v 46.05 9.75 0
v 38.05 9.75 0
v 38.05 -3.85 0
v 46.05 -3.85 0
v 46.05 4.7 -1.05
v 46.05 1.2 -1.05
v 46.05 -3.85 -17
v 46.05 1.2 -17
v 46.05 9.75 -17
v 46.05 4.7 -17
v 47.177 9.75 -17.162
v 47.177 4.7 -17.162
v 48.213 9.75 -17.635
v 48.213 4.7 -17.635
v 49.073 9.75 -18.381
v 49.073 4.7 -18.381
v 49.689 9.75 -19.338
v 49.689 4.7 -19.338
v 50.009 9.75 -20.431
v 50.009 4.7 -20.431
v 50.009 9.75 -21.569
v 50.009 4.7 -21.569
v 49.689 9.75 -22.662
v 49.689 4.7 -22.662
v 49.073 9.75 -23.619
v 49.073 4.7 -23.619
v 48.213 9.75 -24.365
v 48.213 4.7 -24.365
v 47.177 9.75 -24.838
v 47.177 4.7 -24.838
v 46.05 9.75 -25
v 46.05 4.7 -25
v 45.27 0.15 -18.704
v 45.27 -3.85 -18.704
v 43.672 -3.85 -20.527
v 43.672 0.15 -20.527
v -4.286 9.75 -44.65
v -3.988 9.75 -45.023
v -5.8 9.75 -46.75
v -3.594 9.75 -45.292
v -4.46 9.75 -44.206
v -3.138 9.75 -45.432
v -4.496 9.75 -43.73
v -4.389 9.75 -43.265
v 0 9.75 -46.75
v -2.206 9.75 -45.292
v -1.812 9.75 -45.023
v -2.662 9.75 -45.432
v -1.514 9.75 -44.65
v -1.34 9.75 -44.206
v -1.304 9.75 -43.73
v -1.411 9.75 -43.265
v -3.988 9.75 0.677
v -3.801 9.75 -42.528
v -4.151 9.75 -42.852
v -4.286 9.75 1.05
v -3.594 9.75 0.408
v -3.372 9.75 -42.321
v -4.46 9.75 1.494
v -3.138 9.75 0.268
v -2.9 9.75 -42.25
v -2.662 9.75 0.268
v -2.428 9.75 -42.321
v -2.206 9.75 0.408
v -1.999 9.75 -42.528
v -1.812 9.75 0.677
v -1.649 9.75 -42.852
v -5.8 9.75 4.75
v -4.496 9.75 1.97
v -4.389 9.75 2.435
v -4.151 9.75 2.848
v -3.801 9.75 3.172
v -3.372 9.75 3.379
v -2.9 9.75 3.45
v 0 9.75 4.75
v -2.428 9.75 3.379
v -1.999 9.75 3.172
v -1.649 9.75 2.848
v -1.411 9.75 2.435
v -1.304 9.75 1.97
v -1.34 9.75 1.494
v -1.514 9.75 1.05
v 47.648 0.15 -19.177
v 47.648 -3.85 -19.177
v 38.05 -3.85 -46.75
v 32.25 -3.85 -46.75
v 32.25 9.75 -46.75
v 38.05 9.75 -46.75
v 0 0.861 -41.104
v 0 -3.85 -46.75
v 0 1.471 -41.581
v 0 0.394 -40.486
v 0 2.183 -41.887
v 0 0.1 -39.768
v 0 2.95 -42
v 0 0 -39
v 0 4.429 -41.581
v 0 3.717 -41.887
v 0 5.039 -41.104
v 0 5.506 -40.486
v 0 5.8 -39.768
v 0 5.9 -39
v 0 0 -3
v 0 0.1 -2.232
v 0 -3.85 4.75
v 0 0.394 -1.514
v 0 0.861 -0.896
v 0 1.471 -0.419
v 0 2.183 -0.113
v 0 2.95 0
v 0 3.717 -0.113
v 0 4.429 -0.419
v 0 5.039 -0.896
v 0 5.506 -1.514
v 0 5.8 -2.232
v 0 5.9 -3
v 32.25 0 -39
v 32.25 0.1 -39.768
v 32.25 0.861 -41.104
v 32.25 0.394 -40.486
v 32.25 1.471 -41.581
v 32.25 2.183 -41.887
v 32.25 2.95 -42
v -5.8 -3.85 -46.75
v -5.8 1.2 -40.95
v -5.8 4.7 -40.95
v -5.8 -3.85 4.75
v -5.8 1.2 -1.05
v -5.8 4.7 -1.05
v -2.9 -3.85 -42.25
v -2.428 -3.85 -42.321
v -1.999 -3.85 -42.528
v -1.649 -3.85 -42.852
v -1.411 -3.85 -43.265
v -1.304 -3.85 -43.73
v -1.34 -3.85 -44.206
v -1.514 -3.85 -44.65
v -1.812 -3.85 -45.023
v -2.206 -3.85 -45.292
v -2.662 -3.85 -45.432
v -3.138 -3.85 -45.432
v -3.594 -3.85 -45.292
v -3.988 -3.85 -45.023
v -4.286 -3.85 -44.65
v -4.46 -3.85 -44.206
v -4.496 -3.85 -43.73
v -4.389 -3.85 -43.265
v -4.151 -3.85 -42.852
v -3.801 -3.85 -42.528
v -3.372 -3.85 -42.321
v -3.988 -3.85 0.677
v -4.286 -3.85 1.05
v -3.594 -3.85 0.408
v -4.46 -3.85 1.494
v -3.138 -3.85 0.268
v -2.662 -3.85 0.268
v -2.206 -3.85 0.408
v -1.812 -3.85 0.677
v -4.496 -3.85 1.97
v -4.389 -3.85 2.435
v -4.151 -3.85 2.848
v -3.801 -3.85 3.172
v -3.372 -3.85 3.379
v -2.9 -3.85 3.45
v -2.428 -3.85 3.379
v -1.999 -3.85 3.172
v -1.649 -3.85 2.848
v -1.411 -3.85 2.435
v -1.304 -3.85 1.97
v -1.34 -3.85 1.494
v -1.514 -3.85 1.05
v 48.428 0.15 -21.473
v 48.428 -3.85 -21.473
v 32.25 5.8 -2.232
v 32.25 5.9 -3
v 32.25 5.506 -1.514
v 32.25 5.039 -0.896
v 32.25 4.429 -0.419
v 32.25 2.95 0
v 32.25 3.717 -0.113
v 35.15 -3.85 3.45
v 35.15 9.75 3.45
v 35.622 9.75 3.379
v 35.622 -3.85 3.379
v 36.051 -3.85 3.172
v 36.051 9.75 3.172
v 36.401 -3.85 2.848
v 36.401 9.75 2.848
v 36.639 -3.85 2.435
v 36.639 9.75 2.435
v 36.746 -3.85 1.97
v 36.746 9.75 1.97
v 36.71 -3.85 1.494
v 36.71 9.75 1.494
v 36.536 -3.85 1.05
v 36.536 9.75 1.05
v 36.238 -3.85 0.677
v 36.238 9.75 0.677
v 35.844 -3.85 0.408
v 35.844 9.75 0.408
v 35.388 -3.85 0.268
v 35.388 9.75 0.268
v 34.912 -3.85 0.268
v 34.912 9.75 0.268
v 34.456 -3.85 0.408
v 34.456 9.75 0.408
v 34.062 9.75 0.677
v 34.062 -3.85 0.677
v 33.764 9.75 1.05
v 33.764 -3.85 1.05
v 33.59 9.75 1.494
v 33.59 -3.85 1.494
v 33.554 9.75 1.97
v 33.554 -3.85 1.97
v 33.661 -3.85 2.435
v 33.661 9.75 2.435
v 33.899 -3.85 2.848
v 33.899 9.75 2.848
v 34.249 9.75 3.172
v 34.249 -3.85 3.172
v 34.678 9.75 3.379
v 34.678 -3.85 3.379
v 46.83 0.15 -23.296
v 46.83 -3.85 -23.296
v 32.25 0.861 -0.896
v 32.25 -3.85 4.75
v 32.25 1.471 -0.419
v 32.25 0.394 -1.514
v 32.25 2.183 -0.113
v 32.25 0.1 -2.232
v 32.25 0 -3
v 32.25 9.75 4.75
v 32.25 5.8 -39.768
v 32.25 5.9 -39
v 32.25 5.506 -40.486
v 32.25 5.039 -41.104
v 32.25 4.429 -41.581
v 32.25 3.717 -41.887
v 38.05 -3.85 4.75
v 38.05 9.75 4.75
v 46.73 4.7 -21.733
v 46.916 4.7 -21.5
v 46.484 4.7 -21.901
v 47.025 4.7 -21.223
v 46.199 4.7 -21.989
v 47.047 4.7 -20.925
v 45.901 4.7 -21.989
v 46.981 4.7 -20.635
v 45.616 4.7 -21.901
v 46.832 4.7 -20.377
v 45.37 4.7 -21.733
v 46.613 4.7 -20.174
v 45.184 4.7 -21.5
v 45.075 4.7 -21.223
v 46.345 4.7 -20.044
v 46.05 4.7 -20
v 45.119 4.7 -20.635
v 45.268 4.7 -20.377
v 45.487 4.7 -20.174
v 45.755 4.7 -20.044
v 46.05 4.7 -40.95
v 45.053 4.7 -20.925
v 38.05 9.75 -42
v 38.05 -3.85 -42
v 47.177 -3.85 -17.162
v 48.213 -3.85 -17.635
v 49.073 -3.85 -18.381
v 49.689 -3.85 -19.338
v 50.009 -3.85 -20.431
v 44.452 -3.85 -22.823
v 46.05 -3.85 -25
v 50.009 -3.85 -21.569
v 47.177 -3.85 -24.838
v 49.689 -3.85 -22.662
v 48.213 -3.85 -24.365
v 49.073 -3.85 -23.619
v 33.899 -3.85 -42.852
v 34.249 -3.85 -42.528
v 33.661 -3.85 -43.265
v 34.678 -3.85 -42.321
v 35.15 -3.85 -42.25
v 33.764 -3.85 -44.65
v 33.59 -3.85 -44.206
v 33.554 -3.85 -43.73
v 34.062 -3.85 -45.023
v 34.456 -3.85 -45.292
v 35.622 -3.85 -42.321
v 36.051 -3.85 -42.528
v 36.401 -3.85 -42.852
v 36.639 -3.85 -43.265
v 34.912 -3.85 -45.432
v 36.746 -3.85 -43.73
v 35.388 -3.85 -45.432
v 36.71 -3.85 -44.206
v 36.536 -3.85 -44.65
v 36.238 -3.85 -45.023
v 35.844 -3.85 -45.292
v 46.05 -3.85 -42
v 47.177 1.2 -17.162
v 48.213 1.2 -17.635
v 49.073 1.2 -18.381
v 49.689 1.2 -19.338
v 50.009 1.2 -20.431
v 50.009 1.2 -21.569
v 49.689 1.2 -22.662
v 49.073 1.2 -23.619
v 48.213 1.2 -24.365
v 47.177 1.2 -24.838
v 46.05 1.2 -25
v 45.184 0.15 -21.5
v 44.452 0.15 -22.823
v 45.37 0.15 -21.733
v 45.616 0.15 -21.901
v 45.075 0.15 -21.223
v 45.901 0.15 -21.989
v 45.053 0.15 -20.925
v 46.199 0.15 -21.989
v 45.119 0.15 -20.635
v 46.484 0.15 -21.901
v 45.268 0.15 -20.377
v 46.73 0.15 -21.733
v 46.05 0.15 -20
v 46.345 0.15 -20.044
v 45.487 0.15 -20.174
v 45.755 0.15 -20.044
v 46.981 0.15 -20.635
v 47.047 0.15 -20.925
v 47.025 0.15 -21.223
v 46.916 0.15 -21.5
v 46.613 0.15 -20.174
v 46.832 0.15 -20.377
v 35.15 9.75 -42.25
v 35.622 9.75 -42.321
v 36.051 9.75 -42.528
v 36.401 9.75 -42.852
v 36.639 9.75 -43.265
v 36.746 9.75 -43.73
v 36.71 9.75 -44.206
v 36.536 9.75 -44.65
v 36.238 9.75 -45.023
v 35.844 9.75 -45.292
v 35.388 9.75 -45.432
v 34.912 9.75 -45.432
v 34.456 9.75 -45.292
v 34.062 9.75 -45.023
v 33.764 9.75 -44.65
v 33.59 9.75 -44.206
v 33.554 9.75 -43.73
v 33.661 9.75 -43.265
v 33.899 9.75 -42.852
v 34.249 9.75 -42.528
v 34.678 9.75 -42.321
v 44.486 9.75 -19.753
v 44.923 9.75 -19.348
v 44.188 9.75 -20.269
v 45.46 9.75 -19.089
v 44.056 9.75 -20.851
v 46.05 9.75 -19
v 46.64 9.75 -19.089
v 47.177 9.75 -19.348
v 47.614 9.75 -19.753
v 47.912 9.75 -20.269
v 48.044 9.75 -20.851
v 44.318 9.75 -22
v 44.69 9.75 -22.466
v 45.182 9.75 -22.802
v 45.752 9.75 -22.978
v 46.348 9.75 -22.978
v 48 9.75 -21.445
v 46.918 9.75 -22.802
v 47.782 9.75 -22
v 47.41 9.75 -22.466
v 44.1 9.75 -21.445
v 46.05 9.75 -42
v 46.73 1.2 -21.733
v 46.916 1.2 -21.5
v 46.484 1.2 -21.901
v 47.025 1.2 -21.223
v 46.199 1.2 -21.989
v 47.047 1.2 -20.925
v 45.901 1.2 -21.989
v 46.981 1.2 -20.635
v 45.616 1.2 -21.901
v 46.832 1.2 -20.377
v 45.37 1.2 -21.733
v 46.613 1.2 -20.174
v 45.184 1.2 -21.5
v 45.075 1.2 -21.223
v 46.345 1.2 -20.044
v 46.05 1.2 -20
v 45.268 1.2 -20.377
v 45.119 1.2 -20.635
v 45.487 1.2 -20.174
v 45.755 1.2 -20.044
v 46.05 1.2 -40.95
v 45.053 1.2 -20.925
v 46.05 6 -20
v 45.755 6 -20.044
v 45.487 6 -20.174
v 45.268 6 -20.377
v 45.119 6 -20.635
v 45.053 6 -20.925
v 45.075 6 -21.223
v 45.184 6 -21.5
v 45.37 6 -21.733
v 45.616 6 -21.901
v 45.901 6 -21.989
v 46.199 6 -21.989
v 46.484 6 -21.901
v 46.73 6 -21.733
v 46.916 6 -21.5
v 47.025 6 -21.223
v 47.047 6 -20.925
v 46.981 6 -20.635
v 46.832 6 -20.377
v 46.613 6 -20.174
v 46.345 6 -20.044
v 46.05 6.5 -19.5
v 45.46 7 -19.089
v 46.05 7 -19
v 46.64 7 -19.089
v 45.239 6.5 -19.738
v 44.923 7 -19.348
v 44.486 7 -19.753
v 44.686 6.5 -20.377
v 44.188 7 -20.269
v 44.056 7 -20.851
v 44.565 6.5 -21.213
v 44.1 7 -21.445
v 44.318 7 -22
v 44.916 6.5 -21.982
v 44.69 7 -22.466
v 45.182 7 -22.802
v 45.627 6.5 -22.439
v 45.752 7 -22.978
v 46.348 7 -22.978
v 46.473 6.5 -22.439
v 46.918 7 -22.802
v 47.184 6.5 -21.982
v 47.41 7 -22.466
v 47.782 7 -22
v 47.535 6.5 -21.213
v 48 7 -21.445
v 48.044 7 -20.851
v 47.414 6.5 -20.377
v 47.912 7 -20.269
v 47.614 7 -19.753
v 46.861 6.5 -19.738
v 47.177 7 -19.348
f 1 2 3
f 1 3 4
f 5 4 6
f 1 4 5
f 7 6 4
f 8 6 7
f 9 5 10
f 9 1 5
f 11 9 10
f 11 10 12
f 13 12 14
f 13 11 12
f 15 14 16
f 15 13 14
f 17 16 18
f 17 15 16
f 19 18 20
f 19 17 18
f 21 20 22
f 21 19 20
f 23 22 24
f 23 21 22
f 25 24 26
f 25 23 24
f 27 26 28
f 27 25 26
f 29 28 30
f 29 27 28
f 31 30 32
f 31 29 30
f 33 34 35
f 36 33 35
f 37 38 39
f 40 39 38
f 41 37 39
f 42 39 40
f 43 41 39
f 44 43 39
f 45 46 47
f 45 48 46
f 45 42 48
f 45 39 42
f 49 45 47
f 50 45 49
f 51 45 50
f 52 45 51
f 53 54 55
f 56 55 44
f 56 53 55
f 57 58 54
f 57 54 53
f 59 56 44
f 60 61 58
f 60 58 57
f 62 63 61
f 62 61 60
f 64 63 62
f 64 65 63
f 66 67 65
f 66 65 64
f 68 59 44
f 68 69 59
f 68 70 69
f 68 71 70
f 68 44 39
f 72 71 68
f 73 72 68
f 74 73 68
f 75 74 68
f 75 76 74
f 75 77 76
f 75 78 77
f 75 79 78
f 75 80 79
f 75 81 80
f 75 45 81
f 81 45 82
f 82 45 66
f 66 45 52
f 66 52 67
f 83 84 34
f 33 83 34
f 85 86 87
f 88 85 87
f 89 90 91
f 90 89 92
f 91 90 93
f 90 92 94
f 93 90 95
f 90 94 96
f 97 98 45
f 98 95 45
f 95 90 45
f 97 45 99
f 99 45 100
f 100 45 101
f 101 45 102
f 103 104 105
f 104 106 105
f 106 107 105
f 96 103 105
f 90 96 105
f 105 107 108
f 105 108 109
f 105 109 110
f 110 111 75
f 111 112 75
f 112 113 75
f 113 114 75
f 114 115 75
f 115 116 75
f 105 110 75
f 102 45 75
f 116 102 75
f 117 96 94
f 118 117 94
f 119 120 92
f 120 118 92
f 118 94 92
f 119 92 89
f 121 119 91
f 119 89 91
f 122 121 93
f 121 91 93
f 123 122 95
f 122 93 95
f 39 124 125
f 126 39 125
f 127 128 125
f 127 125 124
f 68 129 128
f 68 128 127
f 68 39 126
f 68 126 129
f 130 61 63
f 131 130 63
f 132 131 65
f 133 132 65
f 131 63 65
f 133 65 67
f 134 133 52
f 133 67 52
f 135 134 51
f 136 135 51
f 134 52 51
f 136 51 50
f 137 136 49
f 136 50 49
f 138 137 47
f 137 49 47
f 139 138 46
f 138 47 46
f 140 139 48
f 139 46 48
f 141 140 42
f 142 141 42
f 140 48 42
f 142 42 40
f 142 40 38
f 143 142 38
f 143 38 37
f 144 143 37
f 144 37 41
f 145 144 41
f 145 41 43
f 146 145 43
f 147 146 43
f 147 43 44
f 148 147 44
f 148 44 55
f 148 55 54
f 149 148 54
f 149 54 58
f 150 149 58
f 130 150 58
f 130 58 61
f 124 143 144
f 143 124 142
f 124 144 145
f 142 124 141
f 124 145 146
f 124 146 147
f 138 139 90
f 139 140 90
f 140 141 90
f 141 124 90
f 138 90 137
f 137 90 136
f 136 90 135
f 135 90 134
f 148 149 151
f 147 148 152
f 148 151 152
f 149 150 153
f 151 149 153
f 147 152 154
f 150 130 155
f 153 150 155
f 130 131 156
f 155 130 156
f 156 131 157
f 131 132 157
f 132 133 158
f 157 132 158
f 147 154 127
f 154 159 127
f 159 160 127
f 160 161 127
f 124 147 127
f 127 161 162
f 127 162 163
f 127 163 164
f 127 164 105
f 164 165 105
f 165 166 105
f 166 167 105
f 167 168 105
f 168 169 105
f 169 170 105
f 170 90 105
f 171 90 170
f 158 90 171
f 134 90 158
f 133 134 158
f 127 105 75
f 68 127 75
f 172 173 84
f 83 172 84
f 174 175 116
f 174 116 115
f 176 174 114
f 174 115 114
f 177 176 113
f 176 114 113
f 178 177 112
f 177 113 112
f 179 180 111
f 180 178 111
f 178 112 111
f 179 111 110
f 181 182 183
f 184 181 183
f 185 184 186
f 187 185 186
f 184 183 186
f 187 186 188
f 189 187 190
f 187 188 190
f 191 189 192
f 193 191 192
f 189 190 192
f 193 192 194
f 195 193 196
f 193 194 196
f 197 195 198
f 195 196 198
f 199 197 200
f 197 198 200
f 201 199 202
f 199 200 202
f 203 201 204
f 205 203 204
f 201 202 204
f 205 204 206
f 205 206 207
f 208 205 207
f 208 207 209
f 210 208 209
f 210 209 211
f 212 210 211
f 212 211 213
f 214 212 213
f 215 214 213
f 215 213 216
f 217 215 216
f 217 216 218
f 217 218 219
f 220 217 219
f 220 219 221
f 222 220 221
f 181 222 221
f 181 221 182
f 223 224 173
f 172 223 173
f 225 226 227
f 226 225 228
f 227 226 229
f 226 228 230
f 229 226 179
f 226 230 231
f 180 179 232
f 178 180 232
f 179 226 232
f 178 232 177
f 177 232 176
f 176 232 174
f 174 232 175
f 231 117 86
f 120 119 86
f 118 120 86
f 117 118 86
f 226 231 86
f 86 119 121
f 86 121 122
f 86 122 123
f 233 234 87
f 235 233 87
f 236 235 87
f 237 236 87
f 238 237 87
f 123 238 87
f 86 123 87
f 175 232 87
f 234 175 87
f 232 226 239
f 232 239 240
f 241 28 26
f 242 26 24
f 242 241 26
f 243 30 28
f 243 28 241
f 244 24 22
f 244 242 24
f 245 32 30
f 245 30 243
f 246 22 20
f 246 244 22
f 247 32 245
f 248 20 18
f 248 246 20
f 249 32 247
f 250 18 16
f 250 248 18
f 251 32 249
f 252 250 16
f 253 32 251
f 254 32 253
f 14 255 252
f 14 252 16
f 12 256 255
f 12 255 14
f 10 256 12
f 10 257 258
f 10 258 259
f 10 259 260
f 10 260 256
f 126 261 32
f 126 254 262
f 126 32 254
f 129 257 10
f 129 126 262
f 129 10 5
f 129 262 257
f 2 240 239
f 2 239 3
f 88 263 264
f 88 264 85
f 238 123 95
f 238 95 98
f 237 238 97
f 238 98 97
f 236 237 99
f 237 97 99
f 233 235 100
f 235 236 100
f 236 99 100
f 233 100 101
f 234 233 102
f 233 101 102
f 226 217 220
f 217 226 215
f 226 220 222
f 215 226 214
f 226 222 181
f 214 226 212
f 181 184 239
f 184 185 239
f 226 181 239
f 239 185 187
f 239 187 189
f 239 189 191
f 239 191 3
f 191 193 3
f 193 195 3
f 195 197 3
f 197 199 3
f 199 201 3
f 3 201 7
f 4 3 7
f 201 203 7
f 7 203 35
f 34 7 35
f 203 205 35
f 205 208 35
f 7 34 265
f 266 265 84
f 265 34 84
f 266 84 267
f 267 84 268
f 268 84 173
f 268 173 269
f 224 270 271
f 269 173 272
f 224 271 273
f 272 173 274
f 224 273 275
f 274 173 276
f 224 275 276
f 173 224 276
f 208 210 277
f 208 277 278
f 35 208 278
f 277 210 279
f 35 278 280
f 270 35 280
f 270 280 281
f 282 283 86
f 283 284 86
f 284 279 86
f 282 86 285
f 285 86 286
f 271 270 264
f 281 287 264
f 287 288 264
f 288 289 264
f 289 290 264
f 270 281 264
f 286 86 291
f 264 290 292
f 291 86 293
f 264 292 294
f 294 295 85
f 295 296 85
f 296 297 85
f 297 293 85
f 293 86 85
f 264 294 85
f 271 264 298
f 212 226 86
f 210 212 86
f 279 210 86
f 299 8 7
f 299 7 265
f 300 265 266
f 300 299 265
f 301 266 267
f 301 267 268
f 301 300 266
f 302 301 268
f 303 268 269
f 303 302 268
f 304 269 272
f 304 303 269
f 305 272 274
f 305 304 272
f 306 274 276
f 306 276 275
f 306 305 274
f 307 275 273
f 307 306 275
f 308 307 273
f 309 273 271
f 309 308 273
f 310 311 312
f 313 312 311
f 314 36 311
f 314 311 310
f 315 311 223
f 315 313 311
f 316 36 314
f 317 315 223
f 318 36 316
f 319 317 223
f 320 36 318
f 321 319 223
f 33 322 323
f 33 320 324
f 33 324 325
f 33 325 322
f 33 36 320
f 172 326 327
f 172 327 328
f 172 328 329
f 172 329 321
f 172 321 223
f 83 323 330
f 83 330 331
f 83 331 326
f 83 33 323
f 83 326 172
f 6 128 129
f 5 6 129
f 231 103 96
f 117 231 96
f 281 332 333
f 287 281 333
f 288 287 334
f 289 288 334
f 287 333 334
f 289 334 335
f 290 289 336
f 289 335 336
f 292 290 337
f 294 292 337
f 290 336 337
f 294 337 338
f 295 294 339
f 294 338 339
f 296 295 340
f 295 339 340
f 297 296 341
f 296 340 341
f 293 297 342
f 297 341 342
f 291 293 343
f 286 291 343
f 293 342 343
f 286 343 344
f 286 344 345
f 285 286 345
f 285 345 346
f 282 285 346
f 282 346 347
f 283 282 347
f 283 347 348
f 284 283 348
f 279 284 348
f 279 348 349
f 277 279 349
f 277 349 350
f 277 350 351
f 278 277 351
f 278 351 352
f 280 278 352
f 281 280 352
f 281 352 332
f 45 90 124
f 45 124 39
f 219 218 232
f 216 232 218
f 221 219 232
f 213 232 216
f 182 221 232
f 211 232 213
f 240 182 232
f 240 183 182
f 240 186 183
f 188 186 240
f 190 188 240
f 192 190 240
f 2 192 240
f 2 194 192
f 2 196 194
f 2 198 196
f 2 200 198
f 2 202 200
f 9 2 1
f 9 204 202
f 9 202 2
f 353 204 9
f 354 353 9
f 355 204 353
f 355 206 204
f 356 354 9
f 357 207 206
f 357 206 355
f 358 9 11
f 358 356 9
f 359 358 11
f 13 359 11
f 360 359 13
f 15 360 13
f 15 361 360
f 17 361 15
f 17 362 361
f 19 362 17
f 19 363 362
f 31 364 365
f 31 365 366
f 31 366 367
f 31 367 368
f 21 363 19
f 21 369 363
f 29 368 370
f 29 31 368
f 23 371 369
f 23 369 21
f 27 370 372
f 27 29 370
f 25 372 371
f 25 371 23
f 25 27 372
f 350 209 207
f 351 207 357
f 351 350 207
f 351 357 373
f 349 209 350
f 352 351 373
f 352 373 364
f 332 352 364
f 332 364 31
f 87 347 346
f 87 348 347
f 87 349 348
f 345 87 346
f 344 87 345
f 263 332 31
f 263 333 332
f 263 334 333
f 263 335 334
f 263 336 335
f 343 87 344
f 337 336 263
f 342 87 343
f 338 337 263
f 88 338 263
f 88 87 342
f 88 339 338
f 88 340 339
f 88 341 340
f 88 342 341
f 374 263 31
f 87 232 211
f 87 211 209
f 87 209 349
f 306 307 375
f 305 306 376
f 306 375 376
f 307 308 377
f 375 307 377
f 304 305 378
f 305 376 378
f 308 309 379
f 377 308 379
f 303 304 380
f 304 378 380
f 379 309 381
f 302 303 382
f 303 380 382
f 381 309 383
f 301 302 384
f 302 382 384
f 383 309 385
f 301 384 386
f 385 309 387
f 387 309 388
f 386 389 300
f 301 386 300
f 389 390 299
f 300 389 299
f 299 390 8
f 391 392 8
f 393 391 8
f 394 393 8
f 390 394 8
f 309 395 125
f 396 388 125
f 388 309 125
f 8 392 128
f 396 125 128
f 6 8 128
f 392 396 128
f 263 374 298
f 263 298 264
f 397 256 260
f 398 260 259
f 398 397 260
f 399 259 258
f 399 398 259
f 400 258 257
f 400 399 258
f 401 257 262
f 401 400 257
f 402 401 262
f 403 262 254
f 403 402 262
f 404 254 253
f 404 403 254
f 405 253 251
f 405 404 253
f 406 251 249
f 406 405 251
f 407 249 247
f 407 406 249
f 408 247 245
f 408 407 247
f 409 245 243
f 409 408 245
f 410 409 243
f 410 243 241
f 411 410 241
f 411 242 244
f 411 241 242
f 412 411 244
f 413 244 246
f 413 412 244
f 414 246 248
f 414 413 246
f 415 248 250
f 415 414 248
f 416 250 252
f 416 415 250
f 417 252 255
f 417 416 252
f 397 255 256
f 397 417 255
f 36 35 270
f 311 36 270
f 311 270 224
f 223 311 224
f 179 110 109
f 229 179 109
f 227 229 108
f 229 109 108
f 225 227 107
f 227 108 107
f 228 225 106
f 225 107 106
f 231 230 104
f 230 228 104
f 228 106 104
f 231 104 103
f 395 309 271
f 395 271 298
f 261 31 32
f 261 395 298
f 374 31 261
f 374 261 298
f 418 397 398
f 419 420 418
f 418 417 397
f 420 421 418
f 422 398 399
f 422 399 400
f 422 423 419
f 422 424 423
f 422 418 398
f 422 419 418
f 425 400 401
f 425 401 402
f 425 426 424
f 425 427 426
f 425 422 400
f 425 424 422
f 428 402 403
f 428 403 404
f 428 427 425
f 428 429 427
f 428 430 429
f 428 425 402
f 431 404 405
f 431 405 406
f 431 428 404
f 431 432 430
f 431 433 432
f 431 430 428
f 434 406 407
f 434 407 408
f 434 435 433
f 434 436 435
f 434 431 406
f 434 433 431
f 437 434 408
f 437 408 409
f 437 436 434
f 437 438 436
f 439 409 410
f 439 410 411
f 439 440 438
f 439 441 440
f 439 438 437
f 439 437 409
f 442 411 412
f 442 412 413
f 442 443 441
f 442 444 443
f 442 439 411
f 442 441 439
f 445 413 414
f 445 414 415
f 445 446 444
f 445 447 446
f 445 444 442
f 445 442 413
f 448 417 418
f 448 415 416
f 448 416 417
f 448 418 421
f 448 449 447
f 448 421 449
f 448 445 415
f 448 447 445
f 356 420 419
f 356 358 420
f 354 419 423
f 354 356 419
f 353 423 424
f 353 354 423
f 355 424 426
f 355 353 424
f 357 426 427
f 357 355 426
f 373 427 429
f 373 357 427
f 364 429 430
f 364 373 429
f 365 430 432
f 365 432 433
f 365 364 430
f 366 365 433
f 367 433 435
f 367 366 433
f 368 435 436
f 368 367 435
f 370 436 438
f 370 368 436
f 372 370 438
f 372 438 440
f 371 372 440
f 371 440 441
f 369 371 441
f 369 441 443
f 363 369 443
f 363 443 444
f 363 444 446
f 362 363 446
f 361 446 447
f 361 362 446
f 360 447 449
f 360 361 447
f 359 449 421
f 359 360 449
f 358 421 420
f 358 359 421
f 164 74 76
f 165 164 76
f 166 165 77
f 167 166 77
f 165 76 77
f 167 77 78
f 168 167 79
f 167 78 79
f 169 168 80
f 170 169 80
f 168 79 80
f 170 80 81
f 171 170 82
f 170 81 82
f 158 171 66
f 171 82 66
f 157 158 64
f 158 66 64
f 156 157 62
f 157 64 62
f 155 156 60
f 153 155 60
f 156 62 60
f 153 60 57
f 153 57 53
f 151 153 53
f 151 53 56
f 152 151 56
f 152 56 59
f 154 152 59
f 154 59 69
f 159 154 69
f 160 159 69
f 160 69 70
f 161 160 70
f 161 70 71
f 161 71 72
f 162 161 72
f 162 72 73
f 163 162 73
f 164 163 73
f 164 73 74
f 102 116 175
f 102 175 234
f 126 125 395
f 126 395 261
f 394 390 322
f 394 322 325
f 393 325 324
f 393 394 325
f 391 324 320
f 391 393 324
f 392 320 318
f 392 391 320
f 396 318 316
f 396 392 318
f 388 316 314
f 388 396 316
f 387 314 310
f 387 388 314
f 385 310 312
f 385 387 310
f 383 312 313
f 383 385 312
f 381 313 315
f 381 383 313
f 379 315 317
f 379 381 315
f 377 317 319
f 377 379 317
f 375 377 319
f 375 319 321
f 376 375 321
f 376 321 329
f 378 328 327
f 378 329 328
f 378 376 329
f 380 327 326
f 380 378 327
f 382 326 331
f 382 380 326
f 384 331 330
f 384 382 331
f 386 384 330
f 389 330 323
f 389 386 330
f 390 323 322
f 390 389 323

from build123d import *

# Parameters (mm, degrees)
SKETCH1_W           = 42
SKETCH1_H           = 5.9
SKETCH1_W_2         = 39.9
SKETCH1_H_2         = 3.5
BOSS_EXTRUDE1_DEPTH = 32.25
FILLET2_R           = 3
SKETCH2_W           = 51.5
SKETCH2_H           = 13.6
SKETCH2_W_2         = 39.9
SKETCH2_H_2         = 3.5
BOSS_EXTRUDE2_DEPTH = 5.8
SKETCH3_W           = 51.5
SKETCH3_H           = 13.6
SKETCH3_W_2         = 39.9
SKETCH3_H_2         = 3.5
BOSS_EXTRUDE3_DEPTH = 5.8
SKETCH4_R           = 1.6
CUT_EXTRUDE1_DEPTH  = 62.792596644
BOSS_EXTRUDE4_DEPTH = 13.6
CUT_EXTRUDE4_DEPTH  = 4
SKETCH15_W          = 39.9
SKETCH15_H          = 3.5
CUT_EXTRUDE5_DEPTH  = 74.483654645


with BuildPart() as part:
    # Sketch1 → Boss-Extrude1 (new body)
    with BuildSketch(Plane(origin=(0, 0, 0), x_dir=(0, 0, -1), z_dir=(1, 0, 0))):
        with Locations((21, 2.95)):
            Rectangle(SKETCH1_W, SKETCH1_H)
        with Locations((21, 2.95)):
            Rectangle(SKETCH1_W_2, SKETCH1_H_2, mode=Mode.SUBTRACT)
    extrude(amount=BOSS_EXTRUDE1_DEPTH)

    # Fillet2
    # the kernel refuses this fillet: 3 mm, written as the material it takes off along each edge
    with BuildSketch(Plane(origin=(-7.5, 0, -42), x_dir=(0, 0, 1), z_dir=(1, 0, 0)), Plane(origin=(-7.5, 5.9, 0), x_dir=(0, 0, -1), z_dir=(1, 0, 0)), Plane(origin=(-7.5, 5.9, -42), x_dir=(0, -1, 0), z_dir=(1, 0, 0))) as fillet2_piece_1:
        with BuildLine():
            CenterArc((FILLET2_R, -FILLET2_R), FILLET2_R, 90, 90)
            Line((0, -FILLET2_R), (0, 0))
            Line((0, 0), (FILLET2_R, 0))
        make_face()
    extrude(amount=47.25, mode=Mode.SUBTRACT)
    with BuildSketch(Plane(origin=(-7.5, 0, 0), x_dir=(0, 0, -1), z_dir=(1, 0, 0))) as fillet2_piece_2:
        with BuildLine():
            CenterArc((FILLET2_R, FILLET2_R), FILLET2_R, 180, 90)
            Line((0, FILLET2_R), (0, 0))
            Line((0, 0), (FILLET2_R, 0))
        make_face()
    extrude(amount=47.25, mode=Mode.SUBTRACT)

    # Sketch2 → Boss-Extrude2 (add)
    with BuildSketch(Plane(origin=(32.25, 0, 0), x_dir=(0, 0, -1), z_dir=(1, 0, 0))):
        with Locations((21, 2.95)):
            Rectangle(SKETCH2_W, SKETCH2_H)
        with Locations((21, 2.95)):
            Rectangle(SKETCH2_W_2, SKETCH2_H_2, mode=Mode.SUBTRACT)
    extrude(amount=BOSS_EXTRUDE2_DEPTH)

    # Sketch3 → Boss-Extrude3 (add)
    with BuildSketch(Plane.ZY):
        with Locations((-21, 2.95)):
            Rectangle(SKETCH3_W, SKETCH3_H)
        with Locations((-21, 2.95)):
            Rectangle(SKETCH3_W_2, SKETCH3_H_2, mode=Mode.SUBTRACT)
    extrude(amount=BOSS_EXTRUDE3_DEPTH)

    # Sketch4 → Cut-Extrude1 (cut, through all)
    with BuildSketch(Plane(origin=(0, 9.75, 0), x_dir=(1, 0, 0), z_dir=(0, 1, 0))):
        with Locations(Location((-2.9, 43.85, 0), (0, 0, 270))):
            Circle(SKETCH4_R)
        with Locations(Location((35.15, 43.85, 0), (0, 0, 270))):
            Circle(SKETCH4_R)
        with Locations(Location((-2.9, -1.85, 0), (0, 0, 270))):
            Circle(SKETCH4_R)
        with Locations(Location((35.15, -1.85, 0), (0, 0, 270))):
            Circle(SKETCH4_R)
    extrude(amount=-CUT_EXTRUDE1_DEPTH, mode=Mode.SUBTRACT)

    # Sketch8 → Boss-Extrude4 (add)
    with BuildSketch(Plane(origin=(0, 9.75, 0), x_dir=(1, 0, 0), z_dir=(0, 1, 0))):
        with BuildLine():
            ThreePointArc((46.05, 17), (50.05, 21), (46.05, 25))
            Line((46.05, 25), (46.05, 41.999583304))
            Line((46.05, 41.999583304), (38.05, 41.999583304))
            Line((38.05, 41.999583304), (38.05, 0.000416696))
            Line((38.05, 0.000416696), (46.05, 0.000416696))
            Line((46.05, 0.000416696), (46.05, 17))
        make_face()
    extrude(amount=-BOSS_EXTRUDE4_DEPTH)

    # Sketch13 → CSK for M2 Flat Head Machine Screw1 (revolve, cut)
    with BuildSketch(Plane(origin=(46.05, 9.75, -21), x_dir=(0, 0, 1), z_dir=(1, 0, 0))):
        Polygon((0, 0), (0, 13.6), (1, 13.6), (1, 3.75), (2, 2.75), (2, 0), align=None)
    revolve(axis=Axis((46.05, 16.1, -21), (0, -1, 0)), mode=Mode.SUBTRACT)

    # Sketch14 → Cut-Extrude4 (cut)
    with BuildSketch(Plane.XZ.offset(3.85)):
        Polygon((43.671623782, -20.5274256), (44.451550455, -22.823447025), (46.829926673, -23.296021425), (48.428376218, -21.4725744), (47.648449545, -19.176552975), (45.270073327, -18.703978575), align=None)
    extrude(amount=-CUT_EXTRUDE4_DEPTH, mode=Mode.SUBTRACT)

    # Sketch15 → Cut-Extrude5 (cut, through all)
    with BuildSketch(Plane.ZY.offset(5.8)):
        with Locations((-21, 2.95)):
            Rectangle(SKETCH15_W, SKETCH15_H)
    extrude(amount=-CUT_EXTRUDE5_DEPTH, mode=Mode.SUBTRACT)


solid = part.part
